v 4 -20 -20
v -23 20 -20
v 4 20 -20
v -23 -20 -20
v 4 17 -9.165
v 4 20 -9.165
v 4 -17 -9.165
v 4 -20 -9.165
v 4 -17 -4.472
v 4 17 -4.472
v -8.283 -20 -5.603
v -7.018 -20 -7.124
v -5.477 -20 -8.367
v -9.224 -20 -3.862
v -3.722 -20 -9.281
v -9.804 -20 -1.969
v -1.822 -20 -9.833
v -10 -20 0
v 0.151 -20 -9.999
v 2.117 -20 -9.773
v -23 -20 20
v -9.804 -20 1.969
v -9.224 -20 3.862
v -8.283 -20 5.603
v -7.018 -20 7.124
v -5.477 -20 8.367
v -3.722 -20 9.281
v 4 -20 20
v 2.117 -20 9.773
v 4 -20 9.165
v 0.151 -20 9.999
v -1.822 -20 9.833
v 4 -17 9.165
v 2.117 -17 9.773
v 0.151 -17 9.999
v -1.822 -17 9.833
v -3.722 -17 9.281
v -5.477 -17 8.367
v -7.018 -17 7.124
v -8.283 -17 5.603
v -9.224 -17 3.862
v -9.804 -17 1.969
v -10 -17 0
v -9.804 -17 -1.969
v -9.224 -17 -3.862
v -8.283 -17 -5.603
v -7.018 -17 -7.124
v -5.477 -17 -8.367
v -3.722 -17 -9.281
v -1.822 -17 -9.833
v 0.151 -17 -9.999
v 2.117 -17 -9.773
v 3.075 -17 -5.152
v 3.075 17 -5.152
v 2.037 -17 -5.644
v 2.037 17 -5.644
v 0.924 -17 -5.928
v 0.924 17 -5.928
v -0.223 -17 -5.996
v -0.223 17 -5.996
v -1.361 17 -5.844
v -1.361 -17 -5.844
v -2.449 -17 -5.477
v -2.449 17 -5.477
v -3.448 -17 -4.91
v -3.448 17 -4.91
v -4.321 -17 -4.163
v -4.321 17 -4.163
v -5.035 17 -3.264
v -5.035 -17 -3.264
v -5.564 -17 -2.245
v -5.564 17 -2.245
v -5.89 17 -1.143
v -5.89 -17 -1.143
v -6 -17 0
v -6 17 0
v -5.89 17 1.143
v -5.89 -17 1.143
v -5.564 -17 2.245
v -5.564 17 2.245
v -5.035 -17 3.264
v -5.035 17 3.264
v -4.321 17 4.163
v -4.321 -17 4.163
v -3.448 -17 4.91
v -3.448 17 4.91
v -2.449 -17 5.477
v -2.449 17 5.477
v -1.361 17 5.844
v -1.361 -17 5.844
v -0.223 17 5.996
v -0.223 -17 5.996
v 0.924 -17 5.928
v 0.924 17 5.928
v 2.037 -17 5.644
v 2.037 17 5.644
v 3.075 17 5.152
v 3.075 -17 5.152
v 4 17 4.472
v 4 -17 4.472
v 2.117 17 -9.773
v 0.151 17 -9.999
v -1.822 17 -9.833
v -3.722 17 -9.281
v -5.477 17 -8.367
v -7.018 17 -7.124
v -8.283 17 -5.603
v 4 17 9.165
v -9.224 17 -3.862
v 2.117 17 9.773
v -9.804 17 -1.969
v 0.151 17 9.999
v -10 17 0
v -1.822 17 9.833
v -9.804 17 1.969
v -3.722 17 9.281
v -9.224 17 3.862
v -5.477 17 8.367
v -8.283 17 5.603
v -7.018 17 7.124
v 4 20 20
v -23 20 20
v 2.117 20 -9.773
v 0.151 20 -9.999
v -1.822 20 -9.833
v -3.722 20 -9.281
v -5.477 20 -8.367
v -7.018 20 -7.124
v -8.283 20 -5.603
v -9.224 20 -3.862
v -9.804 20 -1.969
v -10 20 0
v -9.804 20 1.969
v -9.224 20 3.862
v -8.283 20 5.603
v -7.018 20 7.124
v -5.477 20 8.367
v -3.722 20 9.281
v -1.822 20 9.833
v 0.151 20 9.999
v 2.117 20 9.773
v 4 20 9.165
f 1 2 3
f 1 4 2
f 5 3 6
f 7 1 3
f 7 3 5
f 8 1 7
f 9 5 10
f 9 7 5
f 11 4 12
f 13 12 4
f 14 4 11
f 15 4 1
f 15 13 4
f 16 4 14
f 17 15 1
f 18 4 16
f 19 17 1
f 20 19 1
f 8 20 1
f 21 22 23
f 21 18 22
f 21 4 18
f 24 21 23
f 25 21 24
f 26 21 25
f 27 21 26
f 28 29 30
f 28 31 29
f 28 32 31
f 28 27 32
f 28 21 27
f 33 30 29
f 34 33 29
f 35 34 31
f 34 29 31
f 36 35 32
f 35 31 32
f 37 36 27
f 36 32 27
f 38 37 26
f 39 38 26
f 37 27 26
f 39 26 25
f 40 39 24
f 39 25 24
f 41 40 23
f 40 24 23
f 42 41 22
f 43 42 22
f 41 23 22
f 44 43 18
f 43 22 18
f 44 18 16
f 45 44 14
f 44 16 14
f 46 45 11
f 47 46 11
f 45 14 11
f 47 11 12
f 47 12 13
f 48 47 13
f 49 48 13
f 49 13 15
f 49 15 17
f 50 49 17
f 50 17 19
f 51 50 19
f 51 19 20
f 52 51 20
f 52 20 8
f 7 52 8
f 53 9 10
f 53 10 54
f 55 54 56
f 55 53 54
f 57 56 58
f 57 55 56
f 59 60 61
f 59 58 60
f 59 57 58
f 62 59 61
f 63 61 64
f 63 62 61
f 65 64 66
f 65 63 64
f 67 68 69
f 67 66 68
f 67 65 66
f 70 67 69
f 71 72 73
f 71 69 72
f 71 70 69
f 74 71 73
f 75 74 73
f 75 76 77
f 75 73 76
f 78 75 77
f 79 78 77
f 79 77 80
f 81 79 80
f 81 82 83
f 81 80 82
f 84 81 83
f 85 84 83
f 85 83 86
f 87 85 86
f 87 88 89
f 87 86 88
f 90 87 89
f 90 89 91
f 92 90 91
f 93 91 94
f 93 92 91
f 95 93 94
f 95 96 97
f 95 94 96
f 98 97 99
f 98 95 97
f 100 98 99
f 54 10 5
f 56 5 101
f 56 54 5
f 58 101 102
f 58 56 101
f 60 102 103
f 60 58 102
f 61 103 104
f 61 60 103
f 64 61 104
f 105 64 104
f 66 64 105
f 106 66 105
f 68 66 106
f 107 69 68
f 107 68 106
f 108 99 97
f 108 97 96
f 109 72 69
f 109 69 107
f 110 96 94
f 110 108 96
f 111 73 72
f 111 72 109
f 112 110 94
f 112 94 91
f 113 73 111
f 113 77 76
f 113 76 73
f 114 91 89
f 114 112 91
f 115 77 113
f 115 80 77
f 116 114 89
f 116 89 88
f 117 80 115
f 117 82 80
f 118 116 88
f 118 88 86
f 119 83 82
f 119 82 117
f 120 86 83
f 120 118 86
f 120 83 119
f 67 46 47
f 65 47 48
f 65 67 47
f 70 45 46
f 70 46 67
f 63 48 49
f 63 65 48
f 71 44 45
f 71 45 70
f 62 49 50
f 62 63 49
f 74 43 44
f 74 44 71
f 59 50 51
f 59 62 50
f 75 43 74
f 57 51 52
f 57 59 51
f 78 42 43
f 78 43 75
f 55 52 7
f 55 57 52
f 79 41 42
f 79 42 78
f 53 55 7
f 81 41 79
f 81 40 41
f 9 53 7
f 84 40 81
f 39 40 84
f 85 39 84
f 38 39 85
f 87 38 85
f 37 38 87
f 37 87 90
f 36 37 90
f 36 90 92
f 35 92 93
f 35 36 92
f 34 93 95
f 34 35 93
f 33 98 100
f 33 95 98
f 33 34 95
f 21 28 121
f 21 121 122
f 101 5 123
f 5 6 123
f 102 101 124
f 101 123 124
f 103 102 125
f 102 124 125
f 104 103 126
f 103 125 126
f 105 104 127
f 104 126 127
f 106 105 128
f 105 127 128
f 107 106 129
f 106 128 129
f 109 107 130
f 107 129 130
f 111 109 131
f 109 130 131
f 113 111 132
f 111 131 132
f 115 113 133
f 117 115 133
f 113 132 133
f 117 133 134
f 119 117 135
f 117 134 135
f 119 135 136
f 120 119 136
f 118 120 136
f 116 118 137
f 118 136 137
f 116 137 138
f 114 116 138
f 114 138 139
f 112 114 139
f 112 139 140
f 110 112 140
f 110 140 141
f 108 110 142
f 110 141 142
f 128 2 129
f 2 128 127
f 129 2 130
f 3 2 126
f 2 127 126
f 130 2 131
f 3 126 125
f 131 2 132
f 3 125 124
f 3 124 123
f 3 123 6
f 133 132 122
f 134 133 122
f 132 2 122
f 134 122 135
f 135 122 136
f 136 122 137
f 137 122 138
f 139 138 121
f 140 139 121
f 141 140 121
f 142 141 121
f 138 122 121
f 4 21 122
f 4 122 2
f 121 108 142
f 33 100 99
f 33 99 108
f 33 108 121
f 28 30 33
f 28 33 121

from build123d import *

# Parameters (mm, degrees)
F1_DEPTH      = 20
F1_DEPTH_BACK = 20
F2_R          = 10
F3_DEPTH      = 3
F4_R          = 10
F5_DEPTH      = 3


with BuildPart() as f1:
    # F0 (on Front) → F1 (new body, two sides)
    with BuildSketch(Plane.XZ) as f1_sk:
        with BuildLine():
            ThreePointArc((4, -4.472136), (-6, 0), (4, 4.472136))
            Line((4, 4.472136), (4, 20))
            Line((4, 20), (-23, 20))
            Line((-23, 20), (-23, -20))
            Line((-23, -20), (4, -20))
            Line((4, -20), (4, -4.472136))
        make_face()
    extrude(amount=F1_DEPTH)
    extrude(f1_sk.sketch, amount=-F1_DEPTH_BACK)

    # F2 (on face) → F3 (cut)
    with BuildSketch(Plane(origin=(0, 20, 0), x_dir=(-1, 0, 0), z_dir=(0, 1, 0))):
        Circle(F2_R)
    extrude(amount=-F3_DEPTH, mode=Mode.SUBTRACT)

    # F4 (on face) → F5 (cut)
    with BuildSketch(Plane.XZ.offset(20)):
        Circle(F4_R)
    extrude(amount=-F5_DEPTH, mode=Mode.SUBTRACT)


solid = f1.part
